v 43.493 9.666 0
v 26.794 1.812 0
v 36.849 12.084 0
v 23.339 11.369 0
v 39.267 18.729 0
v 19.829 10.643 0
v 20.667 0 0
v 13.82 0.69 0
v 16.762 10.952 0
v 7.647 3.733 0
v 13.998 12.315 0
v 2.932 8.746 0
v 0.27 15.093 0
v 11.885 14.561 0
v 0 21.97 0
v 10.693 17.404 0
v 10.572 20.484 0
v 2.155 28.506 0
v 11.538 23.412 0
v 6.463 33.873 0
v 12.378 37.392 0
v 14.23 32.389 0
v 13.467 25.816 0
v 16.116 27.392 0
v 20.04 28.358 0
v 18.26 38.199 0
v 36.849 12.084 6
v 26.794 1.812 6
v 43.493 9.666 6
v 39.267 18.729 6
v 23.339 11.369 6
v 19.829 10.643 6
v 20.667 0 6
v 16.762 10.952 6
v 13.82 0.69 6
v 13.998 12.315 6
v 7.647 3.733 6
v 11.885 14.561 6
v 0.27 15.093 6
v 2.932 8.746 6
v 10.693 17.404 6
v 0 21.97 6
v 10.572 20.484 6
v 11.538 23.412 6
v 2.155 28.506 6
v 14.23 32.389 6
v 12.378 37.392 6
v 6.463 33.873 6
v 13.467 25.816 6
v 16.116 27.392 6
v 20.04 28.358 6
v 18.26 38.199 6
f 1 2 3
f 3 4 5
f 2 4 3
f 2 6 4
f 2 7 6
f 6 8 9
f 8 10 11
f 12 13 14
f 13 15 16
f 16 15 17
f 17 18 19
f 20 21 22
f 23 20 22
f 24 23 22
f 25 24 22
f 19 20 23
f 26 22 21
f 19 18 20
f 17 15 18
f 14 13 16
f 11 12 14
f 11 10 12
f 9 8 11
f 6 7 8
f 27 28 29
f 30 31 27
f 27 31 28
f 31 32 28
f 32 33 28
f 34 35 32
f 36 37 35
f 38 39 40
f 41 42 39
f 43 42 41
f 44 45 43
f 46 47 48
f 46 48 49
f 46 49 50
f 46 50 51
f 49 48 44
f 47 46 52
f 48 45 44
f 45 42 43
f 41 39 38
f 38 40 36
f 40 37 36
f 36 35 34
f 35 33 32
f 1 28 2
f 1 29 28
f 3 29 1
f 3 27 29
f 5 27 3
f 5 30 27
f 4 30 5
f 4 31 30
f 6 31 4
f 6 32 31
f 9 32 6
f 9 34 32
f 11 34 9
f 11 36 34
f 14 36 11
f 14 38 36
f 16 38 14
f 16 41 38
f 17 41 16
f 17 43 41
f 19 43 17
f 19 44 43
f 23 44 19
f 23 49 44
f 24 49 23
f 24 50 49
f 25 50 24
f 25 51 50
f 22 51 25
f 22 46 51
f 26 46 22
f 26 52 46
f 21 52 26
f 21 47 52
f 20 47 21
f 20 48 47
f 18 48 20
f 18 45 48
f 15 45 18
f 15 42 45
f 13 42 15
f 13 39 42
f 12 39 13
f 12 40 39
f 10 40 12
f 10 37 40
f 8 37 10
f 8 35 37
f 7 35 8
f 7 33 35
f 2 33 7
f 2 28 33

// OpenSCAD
$fn = 32;

// ----------------------------------------------------------------------
// Hook plate: curl radius 14 mm over 205 degrees, 10 mm thick band
// ----------------------------------------------------------------------

// --- parameters (mm) ---
profile_height = 6;       // extrusion height
profile_points = 26;      // points of the closed outline

profile = [[14.23, 32.389], [18.26, 38.199], [12.378, 37.392], [6.463, 33.873], [2.155, 28.506], [0, 21.97], [0.27, 15.093], [2.932, 8.746], [7.647, 3.733], [13.82, 0.69], [20.667, 0], [26.794, 1.812], [43.493, 9.666], [36.849, 12.084], [39.267, 18.729], [23.339, 11.369], [19.829, 10.643], [16.762, 10.952], [13.998, 12.315], [11.885, 14.561], [10.693, 17.404], [10.572, 20.484], [11.538, 23.412], [13.467, 25.816], [16.116, 27.392], [20.04, 28.358]];  // single closed polygon, 26 points, counter clockwise

// --- the one profile operation ---
linear_extrude(height = profile_height) polygon(points = profile);
